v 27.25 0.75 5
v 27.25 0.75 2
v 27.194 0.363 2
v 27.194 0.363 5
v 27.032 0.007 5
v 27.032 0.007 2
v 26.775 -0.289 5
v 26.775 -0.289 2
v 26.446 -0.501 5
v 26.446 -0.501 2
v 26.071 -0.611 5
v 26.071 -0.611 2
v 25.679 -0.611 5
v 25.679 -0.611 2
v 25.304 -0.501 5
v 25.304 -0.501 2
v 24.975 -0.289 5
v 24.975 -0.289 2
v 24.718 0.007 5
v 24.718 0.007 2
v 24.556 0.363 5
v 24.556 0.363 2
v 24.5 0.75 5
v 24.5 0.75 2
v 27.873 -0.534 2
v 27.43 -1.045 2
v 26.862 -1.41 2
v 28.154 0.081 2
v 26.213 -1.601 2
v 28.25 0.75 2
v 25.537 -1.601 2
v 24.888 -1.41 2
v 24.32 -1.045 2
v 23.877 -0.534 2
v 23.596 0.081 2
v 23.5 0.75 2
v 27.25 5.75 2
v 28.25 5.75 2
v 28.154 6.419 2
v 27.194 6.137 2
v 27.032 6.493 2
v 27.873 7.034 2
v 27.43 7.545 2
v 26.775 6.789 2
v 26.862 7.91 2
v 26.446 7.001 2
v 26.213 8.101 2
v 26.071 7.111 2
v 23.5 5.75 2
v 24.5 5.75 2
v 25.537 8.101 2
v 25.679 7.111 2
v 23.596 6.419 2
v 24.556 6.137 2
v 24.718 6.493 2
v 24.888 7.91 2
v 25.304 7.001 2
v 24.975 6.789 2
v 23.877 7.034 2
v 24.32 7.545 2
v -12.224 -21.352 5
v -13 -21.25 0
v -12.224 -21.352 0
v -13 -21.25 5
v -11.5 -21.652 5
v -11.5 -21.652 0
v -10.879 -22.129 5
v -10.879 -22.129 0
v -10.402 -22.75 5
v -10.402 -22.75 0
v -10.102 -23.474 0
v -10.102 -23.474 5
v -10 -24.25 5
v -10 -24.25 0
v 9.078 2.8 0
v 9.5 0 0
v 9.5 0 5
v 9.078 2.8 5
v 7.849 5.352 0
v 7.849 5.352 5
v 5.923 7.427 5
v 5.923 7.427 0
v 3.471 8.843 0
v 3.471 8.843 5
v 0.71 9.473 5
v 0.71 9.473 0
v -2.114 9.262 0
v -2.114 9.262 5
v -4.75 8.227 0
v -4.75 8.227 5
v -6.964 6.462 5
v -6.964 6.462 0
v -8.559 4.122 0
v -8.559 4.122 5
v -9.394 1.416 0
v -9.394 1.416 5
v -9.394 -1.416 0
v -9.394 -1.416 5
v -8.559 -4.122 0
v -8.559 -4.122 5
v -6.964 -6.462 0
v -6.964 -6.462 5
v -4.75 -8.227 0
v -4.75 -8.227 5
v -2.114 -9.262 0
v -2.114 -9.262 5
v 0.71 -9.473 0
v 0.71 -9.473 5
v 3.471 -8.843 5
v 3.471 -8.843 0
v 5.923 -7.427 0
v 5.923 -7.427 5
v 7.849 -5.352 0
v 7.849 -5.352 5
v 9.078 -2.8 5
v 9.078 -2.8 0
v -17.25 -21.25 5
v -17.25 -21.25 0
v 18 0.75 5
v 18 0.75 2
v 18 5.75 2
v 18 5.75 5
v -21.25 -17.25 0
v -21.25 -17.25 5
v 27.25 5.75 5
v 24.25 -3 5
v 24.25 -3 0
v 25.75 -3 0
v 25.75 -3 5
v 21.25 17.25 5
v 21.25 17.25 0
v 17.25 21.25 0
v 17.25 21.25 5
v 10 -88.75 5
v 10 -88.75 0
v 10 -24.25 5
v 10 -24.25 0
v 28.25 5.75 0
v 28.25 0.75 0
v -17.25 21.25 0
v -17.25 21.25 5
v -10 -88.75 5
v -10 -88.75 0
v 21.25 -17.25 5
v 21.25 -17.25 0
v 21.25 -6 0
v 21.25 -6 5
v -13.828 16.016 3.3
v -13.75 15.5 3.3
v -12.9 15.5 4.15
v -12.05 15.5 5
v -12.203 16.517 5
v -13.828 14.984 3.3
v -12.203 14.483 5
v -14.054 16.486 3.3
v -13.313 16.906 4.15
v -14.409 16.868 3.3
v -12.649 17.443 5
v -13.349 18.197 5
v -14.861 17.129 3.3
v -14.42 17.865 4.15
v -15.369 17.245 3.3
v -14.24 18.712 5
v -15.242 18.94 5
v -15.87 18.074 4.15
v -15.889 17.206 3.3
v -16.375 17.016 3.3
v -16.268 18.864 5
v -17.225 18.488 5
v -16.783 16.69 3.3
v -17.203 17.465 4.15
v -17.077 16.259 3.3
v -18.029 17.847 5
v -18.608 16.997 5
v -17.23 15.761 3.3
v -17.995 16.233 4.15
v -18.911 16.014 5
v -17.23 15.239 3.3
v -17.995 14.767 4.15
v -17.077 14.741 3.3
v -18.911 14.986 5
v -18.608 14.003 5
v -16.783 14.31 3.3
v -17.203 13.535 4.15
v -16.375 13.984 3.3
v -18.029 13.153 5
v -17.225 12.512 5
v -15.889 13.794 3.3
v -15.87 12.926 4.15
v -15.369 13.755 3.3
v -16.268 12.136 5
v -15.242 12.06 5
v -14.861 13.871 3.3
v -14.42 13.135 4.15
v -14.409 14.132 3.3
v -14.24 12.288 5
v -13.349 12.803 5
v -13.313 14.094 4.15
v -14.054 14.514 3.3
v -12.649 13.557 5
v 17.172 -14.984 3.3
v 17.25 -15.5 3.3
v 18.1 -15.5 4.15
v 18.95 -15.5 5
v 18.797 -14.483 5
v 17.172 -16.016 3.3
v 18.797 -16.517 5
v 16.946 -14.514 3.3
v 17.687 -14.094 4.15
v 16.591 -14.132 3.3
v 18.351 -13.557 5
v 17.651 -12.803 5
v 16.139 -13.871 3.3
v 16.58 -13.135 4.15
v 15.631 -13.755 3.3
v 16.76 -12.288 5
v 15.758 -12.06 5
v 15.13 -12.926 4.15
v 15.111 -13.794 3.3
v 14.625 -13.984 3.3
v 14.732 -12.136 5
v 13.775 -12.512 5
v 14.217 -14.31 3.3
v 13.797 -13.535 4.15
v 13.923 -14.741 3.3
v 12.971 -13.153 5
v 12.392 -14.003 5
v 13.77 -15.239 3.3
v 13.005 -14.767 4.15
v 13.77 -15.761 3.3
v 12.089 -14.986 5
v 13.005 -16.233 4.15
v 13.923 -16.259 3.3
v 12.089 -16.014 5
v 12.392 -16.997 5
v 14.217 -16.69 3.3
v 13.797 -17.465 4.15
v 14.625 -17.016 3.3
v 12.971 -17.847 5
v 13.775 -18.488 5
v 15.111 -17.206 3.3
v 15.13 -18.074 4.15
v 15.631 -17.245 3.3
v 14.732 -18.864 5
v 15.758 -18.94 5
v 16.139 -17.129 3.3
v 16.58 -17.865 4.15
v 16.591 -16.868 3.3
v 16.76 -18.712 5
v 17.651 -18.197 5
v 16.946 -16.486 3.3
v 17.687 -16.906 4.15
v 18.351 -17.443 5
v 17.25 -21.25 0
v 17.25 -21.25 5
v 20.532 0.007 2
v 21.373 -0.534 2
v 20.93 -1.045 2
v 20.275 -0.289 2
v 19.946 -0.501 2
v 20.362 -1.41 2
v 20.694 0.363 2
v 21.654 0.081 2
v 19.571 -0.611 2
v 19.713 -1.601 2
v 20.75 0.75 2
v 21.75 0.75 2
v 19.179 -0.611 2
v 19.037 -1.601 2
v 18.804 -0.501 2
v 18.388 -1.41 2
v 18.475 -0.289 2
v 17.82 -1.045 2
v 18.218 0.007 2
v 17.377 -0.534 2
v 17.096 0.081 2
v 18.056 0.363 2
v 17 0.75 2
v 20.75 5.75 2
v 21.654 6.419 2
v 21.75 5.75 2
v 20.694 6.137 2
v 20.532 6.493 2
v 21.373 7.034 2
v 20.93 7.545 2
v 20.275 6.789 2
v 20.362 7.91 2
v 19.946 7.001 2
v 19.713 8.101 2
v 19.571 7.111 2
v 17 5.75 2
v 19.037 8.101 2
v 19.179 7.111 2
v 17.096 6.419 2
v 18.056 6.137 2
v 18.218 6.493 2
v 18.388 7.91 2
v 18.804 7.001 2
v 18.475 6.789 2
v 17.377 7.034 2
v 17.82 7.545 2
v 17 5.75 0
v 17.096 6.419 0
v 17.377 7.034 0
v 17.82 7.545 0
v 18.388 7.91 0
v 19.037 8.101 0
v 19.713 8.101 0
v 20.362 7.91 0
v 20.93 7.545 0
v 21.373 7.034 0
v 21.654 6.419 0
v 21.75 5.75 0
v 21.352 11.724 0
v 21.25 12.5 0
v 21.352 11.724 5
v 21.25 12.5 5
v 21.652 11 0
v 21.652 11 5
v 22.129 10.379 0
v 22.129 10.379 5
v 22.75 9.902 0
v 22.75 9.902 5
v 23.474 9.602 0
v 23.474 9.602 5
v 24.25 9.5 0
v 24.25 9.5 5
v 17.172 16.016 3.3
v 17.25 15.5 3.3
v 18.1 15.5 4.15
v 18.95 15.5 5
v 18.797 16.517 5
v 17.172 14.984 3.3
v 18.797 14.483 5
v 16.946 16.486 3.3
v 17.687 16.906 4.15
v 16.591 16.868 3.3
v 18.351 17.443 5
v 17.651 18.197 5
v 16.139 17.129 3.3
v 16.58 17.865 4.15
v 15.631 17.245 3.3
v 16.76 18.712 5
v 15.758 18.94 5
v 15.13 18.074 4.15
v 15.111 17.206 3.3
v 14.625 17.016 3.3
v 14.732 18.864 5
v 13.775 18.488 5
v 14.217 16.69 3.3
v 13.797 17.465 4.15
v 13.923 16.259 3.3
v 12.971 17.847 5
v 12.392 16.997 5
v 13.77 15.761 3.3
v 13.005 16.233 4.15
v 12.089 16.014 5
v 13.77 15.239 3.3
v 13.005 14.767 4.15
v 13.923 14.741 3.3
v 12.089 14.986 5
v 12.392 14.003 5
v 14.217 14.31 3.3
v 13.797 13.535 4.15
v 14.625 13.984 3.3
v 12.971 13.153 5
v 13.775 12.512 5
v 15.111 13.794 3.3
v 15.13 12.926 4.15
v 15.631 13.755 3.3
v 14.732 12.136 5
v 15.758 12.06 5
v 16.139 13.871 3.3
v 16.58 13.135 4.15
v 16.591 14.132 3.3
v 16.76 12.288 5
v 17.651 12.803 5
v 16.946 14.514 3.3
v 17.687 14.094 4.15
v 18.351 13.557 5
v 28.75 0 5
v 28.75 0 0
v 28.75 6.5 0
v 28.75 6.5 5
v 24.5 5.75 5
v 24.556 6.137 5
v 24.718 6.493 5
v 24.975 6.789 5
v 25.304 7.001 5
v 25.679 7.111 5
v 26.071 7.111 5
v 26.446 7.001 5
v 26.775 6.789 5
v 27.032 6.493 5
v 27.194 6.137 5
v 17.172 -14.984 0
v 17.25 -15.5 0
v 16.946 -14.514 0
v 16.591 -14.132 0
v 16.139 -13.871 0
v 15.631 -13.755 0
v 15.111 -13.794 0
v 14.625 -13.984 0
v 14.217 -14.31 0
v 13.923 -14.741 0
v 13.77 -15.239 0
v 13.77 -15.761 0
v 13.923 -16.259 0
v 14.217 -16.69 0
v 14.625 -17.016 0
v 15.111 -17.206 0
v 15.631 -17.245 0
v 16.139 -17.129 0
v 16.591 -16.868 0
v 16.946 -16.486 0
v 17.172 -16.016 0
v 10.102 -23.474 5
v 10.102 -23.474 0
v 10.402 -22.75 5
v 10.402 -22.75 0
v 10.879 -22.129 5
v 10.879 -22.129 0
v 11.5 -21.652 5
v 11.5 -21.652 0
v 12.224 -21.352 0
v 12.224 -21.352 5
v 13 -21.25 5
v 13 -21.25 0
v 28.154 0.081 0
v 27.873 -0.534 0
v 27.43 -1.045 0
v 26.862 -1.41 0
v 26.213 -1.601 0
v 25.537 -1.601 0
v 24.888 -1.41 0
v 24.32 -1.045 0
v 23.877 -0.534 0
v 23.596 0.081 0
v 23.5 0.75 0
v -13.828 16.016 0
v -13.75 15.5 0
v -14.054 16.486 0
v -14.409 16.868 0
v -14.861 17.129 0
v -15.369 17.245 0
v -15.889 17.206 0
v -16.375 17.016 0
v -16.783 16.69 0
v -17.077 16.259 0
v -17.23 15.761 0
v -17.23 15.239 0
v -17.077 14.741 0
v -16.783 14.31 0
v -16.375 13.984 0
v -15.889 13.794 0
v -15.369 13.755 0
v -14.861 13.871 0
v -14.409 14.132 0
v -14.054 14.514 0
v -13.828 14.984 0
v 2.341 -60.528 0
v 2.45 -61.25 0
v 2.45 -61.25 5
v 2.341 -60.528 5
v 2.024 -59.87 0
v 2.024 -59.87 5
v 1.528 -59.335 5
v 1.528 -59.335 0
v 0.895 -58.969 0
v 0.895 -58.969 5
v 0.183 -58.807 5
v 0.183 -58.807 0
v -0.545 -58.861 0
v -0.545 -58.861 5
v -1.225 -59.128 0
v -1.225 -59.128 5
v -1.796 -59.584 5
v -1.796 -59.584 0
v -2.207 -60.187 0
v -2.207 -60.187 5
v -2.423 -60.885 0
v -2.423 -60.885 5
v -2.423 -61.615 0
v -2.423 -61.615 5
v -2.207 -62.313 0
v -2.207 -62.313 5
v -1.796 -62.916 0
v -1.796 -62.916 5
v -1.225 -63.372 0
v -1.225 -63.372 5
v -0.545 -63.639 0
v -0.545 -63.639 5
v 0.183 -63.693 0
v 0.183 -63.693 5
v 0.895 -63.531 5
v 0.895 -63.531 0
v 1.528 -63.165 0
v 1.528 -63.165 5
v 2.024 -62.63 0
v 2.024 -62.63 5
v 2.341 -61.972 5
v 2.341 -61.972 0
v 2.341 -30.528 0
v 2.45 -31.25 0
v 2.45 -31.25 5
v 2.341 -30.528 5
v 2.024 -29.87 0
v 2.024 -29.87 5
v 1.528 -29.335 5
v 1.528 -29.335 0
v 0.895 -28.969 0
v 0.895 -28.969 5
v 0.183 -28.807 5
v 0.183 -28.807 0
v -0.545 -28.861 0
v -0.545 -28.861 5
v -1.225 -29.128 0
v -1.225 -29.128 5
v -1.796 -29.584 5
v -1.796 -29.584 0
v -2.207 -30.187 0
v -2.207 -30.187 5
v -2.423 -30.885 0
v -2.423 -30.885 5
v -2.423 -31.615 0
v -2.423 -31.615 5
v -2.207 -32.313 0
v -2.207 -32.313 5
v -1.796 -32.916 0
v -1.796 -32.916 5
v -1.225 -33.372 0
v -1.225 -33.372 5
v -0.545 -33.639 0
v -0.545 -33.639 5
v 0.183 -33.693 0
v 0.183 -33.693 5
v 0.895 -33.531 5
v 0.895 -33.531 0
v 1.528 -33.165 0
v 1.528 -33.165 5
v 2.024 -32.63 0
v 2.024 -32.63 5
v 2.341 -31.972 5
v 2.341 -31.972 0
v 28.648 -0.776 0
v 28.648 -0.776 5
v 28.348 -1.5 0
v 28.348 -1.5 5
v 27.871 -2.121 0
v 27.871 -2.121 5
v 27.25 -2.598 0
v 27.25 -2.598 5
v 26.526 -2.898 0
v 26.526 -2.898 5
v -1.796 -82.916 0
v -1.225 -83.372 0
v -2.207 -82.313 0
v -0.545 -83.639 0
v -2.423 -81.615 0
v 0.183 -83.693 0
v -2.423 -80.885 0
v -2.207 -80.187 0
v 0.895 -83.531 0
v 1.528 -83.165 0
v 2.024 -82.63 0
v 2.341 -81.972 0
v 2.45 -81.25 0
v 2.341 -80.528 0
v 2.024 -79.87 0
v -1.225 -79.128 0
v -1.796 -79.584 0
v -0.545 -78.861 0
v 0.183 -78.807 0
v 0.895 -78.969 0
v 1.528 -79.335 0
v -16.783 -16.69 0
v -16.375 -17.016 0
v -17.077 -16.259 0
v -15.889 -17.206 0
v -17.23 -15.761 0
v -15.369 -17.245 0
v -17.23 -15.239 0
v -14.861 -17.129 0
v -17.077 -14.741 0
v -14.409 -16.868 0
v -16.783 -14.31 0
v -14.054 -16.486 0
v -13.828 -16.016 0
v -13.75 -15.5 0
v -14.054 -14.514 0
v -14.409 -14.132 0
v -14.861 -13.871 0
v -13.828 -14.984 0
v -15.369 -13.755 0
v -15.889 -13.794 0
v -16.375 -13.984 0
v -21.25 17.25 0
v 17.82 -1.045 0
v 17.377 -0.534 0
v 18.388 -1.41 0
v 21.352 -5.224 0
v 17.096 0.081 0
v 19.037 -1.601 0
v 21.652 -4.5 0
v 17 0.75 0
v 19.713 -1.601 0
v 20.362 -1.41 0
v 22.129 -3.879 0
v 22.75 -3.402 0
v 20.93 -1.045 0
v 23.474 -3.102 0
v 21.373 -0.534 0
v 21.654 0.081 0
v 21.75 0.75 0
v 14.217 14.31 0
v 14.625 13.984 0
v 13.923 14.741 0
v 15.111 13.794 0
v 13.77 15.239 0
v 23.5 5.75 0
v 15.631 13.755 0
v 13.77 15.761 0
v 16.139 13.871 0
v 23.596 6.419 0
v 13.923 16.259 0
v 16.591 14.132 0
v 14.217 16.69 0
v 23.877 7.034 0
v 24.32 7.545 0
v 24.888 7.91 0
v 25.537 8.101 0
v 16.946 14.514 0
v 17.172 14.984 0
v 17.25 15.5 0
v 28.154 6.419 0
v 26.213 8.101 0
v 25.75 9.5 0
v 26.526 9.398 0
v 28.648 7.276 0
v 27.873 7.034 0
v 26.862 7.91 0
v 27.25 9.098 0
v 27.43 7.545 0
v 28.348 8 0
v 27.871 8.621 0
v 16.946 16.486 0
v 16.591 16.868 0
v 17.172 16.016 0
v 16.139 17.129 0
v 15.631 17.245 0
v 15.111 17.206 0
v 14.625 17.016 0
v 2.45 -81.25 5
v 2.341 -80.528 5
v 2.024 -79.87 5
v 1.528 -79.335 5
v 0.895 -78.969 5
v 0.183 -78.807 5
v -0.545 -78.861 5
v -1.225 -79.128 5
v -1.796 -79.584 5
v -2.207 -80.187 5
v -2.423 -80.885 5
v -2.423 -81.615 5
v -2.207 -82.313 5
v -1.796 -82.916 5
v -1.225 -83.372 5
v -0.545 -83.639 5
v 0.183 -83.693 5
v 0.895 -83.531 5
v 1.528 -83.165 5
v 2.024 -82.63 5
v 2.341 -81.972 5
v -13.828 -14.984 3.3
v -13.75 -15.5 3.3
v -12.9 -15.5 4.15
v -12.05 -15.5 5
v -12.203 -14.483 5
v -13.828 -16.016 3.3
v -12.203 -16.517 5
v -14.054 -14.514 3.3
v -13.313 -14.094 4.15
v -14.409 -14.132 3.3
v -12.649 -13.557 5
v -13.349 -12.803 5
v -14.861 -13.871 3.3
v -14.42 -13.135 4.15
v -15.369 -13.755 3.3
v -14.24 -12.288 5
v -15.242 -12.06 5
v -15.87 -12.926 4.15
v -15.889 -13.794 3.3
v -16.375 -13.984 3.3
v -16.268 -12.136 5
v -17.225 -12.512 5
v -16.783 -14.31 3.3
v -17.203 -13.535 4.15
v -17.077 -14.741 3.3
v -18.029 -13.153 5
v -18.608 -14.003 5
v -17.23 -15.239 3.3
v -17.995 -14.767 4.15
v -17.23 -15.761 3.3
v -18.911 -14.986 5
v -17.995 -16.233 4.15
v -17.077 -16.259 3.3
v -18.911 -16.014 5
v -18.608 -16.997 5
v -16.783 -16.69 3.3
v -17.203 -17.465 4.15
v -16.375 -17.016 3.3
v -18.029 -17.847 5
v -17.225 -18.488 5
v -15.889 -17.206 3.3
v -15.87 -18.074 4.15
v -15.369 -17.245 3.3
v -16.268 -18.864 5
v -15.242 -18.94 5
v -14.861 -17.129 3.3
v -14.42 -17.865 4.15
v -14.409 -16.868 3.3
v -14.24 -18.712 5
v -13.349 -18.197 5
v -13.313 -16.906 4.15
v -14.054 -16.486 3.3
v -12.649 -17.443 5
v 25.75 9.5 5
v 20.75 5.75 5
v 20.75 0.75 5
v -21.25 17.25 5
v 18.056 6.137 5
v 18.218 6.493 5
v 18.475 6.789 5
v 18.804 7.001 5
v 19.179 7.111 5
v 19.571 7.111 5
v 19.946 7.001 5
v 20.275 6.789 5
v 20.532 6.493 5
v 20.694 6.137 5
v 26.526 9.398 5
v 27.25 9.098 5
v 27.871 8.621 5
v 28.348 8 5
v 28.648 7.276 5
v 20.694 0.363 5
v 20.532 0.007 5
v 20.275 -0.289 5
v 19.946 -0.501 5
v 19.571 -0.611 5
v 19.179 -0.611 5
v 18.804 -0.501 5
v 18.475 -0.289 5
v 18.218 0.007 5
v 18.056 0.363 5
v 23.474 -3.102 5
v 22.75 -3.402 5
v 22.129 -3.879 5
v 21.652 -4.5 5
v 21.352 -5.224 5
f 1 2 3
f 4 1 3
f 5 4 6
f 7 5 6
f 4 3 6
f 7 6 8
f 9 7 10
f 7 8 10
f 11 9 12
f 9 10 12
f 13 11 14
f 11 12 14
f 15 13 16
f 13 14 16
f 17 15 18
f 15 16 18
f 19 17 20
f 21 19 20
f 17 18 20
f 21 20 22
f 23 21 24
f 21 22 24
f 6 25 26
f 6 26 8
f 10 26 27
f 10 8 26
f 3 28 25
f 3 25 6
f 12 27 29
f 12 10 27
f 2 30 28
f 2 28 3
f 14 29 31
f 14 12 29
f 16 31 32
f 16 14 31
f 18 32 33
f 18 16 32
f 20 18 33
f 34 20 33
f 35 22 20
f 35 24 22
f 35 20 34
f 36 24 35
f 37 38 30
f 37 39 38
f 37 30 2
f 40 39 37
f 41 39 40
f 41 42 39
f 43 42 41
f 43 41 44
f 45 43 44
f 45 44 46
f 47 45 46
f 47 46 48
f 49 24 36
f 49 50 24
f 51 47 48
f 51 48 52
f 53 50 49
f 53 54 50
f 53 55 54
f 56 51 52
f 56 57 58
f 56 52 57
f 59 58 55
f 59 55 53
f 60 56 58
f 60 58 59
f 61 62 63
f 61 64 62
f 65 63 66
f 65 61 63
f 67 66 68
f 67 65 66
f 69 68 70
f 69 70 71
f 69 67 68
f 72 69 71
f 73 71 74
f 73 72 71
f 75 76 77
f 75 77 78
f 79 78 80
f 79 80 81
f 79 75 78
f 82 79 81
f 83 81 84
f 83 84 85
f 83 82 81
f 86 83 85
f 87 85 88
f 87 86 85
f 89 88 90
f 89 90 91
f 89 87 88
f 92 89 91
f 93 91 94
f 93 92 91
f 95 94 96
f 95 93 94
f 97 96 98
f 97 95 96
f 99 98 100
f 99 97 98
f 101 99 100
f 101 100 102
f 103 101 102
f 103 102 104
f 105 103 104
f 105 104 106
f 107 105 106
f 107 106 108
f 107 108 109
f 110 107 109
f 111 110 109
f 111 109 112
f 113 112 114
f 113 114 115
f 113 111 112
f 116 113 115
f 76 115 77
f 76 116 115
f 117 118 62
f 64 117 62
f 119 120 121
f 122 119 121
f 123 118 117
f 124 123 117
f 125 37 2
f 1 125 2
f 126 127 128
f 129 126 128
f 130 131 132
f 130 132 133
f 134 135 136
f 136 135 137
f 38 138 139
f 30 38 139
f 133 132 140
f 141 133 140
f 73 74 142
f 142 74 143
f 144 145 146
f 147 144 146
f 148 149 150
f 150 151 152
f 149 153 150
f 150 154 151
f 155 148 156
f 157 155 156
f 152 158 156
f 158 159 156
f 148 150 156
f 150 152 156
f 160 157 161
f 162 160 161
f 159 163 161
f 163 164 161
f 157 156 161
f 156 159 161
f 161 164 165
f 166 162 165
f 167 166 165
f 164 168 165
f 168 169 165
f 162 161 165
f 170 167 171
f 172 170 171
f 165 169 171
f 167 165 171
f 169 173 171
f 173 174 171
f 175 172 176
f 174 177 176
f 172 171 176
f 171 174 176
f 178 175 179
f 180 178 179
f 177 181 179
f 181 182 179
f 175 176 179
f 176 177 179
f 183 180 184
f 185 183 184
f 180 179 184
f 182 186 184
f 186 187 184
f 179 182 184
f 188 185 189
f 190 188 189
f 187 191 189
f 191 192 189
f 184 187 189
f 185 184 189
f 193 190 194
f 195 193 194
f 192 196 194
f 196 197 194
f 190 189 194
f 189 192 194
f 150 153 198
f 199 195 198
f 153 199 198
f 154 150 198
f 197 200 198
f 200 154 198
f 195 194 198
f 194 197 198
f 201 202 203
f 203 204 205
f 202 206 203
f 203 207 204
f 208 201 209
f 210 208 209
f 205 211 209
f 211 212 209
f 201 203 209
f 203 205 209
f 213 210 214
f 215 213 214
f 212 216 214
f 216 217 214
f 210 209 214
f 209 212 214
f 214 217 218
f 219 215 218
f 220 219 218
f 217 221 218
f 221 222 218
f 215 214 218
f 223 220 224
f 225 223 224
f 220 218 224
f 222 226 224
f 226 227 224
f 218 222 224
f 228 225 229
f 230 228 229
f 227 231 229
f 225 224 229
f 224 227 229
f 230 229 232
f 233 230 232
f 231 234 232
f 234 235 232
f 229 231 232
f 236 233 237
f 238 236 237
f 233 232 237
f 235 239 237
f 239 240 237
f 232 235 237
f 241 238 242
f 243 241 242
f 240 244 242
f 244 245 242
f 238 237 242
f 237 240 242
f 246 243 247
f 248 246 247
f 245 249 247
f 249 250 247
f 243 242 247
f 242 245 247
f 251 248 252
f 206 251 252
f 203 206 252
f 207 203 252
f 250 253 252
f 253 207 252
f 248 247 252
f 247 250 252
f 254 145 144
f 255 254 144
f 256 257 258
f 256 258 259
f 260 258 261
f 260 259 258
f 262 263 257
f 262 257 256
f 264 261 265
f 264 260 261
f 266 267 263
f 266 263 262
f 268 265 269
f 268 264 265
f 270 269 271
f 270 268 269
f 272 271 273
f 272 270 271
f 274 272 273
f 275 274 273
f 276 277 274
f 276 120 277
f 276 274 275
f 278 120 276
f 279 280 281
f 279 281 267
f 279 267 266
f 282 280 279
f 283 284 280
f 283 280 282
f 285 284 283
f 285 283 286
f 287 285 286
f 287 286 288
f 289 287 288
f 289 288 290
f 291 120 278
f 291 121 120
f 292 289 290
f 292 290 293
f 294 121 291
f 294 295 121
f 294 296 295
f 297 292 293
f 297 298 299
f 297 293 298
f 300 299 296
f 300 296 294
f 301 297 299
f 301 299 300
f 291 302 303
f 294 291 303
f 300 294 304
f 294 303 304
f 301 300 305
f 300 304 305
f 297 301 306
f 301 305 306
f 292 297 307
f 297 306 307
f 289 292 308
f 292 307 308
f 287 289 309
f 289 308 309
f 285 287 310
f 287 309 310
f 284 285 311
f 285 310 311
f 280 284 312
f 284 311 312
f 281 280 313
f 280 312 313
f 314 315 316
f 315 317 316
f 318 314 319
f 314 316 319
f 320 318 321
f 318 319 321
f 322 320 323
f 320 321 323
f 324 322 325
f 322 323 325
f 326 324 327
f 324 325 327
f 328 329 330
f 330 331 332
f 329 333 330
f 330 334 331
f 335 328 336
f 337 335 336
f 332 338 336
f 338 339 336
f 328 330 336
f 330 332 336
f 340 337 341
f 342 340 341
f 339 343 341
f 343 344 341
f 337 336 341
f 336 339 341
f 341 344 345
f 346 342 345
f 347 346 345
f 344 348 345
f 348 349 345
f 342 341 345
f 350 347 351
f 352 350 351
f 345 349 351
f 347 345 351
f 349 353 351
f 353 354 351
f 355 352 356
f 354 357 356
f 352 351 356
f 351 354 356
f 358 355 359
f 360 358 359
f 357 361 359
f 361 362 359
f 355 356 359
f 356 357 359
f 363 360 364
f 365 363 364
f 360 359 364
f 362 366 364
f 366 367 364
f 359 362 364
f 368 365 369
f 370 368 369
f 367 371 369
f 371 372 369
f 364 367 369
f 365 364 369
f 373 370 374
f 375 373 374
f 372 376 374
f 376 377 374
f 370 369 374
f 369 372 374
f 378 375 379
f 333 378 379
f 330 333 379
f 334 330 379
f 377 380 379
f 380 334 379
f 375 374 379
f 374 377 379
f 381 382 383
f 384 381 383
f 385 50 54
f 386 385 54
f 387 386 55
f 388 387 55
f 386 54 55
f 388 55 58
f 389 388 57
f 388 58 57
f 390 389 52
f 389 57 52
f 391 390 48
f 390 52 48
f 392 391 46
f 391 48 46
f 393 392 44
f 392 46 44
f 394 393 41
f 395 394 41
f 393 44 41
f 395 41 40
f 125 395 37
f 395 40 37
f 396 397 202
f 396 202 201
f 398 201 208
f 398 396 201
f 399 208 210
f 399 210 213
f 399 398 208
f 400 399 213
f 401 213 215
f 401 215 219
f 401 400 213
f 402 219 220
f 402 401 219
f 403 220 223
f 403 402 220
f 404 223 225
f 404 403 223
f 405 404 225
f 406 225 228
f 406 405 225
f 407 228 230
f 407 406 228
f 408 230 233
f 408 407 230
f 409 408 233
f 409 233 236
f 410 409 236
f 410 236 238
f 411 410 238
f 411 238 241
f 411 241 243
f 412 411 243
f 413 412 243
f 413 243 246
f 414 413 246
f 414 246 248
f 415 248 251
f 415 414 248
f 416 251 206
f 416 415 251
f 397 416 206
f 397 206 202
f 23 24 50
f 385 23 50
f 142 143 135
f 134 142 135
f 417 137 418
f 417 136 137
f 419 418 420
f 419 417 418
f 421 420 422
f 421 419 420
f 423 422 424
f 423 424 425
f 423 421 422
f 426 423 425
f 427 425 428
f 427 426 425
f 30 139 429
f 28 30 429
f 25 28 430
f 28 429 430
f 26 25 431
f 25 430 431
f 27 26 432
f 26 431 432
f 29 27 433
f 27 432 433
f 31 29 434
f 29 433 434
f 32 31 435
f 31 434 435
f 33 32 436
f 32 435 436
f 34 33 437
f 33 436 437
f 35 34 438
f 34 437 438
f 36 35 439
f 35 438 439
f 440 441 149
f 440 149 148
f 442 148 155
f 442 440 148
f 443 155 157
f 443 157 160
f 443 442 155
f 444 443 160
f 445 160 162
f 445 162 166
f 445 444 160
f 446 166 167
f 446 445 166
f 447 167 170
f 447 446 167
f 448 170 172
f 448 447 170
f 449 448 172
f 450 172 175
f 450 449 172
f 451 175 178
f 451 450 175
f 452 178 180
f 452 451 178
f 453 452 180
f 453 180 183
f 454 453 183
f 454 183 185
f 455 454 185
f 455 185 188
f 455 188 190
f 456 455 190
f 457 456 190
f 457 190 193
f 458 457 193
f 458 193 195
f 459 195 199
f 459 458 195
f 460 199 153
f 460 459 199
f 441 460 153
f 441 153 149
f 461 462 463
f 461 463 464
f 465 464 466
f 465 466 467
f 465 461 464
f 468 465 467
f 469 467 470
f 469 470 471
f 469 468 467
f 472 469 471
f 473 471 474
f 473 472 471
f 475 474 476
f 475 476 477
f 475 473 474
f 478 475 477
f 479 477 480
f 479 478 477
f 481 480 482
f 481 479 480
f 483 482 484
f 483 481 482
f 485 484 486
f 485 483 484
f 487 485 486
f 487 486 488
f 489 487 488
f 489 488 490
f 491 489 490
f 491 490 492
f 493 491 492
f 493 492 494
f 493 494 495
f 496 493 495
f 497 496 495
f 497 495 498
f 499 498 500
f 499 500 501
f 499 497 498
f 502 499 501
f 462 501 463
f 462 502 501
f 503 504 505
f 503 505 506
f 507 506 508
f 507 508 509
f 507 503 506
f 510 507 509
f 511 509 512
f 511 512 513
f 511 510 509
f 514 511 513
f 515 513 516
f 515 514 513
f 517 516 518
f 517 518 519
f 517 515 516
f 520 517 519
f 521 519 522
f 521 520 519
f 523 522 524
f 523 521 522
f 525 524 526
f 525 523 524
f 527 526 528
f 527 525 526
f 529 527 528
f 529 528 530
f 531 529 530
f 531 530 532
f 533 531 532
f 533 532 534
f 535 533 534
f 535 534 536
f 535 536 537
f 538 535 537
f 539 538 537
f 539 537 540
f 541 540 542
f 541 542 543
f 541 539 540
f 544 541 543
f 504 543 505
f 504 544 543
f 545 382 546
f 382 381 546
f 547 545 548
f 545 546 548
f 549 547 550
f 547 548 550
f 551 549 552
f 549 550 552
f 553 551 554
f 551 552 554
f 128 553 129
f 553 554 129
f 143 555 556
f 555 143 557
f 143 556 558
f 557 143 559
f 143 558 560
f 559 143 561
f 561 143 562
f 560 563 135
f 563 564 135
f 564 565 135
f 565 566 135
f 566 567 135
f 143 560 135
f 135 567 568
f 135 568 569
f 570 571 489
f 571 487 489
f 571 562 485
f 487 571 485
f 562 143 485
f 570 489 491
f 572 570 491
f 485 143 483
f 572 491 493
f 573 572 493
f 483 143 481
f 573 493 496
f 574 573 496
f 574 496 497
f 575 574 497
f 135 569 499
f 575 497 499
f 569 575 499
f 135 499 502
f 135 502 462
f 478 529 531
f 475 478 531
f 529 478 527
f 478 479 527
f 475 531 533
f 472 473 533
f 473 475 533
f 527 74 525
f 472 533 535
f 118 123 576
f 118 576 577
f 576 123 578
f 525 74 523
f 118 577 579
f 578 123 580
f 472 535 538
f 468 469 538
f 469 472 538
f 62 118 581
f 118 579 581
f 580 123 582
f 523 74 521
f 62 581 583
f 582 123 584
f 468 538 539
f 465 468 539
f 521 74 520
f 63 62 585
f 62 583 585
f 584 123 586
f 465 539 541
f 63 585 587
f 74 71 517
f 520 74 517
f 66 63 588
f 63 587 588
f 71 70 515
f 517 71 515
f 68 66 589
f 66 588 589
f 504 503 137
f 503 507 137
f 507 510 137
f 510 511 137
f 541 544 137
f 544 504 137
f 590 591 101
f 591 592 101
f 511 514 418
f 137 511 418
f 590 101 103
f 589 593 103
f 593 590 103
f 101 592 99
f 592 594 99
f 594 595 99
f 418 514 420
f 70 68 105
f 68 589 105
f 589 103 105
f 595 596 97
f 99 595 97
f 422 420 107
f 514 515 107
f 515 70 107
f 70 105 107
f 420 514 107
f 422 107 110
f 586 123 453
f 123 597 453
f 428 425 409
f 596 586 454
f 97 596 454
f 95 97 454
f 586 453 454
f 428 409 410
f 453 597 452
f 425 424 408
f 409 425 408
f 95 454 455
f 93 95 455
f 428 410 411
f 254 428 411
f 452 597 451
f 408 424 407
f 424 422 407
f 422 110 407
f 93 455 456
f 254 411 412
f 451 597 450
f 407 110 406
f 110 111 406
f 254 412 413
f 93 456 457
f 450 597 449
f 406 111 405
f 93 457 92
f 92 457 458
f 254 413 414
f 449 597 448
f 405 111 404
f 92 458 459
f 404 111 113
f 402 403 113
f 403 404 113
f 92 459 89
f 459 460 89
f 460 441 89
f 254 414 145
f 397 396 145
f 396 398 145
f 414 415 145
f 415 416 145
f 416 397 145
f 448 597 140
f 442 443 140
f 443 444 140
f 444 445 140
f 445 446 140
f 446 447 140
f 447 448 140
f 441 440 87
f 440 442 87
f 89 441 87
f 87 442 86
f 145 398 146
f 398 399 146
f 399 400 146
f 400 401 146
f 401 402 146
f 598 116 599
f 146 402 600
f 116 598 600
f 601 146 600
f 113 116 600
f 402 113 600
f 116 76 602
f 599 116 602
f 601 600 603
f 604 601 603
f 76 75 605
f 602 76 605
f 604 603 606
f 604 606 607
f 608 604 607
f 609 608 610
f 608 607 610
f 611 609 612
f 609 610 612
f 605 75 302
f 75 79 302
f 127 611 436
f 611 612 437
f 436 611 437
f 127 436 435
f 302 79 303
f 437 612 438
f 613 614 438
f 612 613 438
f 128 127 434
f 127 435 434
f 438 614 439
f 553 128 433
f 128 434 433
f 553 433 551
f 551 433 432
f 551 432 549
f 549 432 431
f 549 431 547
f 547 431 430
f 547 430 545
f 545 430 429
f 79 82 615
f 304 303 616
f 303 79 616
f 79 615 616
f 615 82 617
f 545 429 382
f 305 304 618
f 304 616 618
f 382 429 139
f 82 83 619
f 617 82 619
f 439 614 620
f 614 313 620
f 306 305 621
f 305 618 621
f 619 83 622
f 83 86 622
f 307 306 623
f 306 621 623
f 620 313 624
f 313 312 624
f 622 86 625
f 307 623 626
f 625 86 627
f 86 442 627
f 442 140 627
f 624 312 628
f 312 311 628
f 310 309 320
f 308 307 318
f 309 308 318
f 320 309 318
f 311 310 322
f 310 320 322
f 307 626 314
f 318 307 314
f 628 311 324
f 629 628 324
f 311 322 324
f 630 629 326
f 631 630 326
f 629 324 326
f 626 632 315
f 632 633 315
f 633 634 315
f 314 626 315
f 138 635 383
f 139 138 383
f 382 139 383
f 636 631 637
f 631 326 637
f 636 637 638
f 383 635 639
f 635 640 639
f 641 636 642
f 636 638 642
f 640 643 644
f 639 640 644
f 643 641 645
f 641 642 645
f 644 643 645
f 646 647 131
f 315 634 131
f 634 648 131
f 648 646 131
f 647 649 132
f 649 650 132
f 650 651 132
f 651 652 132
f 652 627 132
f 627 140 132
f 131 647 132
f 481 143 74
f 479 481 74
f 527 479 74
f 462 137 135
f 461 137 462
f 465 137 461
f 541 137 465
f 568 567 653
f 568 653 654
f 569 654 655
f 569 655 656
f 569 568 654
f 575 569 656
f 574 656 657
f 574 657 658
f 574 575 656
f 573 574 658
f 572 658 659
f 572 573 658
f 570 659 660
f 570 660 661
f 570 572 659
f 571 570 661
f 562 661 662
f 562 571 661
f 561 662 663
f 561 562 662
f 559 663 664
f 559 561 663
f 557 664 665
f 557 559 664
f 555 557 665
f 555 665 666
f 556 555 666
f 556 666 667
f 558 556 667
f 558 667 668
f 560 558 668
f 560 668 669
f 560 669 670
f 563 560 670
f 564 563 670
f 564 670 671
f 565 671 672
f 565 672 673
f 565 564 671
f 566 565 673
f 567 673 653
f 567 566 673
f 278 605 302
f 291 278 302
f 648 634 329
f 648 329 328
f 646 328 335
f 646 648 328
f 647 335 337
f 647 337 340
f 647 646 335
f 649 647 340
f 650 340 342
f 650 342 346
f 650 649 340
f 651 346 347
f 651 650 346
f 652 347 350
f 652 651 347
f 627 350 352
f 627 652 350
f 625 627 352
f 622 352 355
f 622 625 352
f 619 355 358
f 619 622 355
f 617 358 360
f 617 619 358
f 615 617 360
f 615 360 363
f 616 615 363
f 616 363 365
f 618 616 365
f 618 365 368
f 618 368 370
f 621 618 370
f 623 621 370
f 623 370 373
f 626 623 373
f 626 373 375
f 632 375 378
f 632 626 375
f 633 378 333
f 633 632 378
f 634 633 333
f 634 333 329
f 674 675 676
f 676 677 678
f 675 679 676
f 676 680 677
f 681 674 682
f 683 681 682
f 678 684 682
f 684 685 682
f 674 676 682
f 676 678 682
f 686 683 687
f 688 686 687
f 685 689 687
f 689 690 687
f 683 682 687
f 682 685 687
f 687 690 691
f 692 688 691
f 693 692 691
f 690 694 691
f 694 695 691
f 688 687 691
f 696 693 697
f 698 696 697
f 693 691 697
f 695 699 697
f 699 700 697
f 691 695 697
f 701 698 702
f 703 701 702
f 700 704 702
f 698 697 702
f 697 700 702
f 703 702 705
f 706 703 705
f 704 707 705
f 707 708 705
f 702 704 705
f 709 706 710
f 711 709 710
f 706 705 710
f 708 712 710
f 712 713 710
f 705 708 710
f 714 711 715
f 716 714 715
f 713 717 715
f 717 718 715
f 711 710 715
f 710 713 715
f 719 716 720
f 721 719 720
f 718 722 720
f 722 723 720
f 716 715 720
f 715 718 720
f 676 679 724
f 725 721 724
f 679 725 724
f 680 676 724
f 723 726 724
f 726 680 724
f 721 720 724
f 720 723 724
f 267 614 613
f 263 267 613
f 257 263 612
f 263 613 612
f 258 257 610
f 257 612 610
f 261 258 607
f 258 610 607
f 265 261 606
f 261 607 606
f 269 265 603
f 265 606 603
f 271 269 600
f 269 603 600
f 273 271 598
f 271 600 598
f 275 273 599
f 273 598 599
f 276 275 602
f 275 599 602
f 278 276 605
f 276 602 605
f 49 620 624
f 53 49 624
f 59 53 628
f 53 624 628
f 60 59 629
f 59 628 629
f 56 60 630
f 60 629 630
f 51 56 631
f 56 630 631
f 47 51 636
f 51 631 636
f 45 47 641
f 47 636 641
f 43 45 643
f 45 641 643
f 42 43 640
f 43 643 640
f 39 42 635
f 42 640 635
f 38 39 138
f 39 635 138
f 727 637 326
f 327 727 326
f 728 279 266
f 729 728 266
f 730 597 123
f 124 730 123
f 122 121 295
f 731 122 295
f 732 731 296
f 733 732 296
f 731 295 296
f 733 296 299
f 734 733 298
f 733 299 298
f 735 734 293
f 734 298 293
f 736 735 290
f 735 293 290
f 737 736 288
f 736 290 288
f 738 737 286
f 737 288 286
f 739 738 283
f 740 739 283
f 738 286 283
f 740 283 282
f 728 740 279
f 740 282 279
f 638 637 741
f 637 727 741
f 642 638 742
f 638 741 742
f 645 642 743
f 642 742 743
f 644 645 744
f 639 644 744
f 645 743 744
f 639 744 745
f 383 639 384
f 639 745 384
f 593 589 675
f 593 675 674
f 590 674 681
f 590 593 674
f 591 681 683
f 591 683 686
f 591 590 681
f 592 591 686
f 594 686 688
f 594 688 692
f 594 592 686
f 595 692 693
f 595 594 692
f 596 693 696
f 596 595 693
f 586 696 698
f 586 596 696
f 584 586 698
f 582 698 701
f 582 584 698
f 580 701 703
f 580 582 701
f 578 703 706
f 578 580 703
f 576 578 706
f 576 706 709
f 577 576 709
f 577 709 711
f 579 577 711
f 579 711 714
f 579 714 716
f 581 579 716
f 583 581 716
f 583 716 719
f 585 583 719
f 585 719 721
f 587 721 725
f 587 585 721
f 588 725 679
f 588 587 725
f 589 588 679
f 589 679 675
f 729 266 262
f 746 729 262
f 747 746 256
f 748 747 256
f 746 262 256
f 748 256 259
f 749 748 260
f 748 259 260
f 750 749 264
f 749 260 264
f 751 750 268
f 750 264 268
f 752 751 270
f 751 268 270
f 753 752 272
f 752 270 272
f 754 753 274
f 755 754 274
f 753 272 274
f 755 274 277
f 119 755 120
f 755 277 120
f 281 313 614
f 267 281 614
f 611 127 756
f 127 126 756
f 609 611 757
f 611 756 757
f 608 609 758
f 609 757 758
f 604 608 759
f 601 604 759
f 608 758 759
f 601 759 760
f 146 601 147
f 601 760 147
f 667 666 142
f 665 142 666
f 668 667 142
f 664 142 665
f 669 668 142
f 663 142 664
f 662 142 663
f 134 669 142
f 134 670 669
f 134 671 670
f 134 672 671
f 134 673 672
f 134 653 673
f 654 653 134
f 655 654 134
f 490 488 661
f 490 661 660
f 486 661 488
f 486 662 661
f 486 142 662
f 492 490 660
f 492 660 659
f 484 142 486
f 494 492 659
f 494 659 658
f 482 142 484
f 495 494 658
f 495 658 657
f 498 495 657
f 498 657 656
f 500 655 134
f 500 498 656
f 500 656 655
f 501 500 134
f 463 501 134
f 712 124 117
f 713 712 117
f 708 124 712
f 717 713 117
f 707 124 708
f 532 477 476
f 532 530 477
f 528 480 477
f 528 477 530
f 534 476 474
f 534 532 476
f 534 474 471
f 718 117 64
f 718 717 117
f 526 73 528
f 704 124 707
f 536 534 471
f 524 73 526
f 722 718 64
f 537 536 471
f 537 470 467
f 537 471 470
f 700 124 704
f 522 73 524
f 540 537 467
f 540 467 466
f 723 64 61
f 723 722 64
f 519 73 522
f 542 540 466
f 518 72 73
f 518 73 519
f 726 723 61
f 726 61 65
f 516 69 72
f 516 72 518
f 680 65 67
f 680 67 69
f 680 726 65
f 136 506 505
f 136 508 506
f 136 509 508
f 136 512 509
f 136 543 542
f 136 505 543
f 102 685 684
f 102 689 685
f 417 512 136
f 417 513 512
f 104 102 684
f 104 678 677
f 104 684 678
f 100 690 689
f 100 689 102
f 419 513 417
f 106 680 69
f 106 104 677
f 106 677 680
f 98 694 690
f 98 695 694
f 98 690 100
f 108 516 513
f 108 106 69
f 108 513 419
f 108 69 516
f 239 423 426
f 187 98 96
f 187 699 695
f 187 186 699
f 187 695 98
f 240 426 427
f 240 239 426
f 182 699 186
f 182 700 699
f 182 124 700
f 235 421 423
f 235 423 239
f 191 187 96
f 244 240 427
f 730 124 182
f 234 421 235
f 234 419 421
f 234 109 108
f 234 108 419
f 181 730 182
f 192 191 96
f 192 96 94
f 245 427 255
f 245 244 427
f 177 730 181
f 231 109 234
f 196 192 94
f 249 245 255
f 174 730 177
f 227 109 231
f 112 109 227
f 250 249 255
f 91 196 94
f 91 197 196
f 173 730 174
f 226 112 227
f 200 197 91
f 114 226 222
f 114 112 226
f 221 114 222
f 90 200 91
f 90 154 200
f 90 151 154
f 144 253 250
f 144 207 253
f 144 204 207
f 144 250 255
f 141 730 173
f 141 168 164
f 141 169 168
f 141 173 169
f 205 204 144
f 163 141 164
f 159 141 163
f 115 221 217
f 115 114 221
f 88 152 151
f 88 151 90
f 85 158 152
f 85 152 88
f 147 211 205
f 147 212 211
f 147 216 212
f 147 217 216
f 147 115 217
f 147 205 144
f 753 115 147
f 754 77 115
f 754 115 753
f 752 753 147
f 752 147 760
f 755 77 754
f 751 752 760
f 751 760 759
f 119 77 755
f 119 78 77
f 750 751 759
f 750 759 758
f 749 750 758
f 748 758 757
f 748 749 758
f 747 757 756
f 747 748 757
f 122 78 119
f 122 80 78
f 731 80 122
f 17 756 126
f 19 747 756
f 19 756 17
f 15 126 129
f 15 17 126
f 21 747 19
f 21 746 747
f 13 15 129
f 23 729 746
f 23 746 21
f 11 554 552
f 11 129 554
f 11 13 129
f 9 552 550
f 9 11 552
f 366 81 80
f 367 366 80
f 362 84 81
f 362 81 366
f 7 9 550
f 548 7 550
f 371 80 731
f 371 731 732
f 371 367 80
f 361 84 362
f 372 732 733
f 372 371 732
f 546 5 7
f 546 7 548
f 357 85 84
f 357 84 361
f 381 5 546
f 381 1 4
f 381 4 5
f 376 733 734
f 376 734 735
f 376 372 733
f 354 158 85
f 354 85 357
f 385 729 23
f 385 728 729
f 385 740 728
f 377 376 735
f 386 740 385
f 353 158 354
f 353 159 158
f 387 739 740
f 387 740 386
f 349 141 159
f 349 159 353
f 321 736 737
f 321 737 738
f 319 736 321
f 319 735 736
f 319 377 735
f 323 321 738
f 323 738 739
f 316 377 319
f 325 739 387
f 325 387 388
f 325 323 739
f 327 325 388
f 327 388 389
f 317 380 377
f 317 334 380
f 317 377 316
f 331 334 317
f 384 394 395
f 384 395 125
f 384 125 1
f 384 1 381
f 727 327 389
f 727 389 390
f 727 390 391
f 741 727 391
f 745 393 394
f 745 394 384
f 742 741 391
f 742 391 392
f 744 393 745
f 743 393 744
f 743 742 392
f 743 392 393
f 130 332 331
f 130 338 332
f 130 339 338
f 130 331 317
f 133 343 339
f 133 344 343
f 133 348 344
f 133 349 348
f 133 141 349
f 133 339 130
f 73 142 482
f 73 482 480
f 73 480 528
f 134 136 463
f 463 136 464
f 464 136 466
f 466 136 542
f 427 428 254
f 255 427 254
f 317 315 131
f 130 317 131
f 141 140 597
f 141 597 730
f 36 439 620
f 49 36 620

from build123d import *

# Parameters (mm, degrees)
SKETCH_1_R          = 1.75
SKETCH_1_R_2        = 9.5
SKETCH_1_R_3        = 2.45
EXTRUDE_1_DEPTH     = 5
CHAMFER_1_SIZE      = 4
FILLET_1_R          = 3
CHAMFER_2_SIZE      = 1.7
CUT_EXTRUDE_1_DEPTH = 2


with BuildPart() as part:
    # Эскиз1 → Бобышка-Вытянуть1 (new body)
    with BuildSketch(Plane.XY):
        Polygon((-21.25, 21.25), (-21.25, -21.25), (-10, -21.25), (-10, -88.75), (10, -88.75), (10, -21.25), (21.25, -21.25), (21.25, -3), (28.75, -3), (28.75, 9.5), (21.25, 9.5), (21.25, 21.25), align=None)
        with Locations((-15.5, -15.5)):
            Circle(SKETCH_1_R, mode=Mode.SUBTRACT)
        with Locations((-15.5, 15.5)):
            Circle(SKETCH_1_R, mode=Mode.SUBTRACT)
        Circle(SKETCH_1_R_2, mode=Mode.SUBTRACT)
        with Locations((15.5, -15.5)):
            Circle(SKETCH_1_R, mode=Mode.SUBTRACT)
        with Locations((15.5, 15.5)):
            Circle(SKETCH_1_R, mode=Mode.SUBTRACT)
        with BuildLine():
            ThreePointArc((20.75, 0.75), (19.375, -0.625), (18, 0.75))
            Line((18, 0.75), (18, 5.75))
            ThreePointArc((18, 5.75), (19.375, 7.125), (20.75, 5.75))
            Line((20.75, 5.75), (20.75, 0.75))
        make_face(mode=Mode.SUBTRACT)
        with Locations((0, -31.25)):
            Circle(SKETCH_1_R_3, mode=Mode.SUBTRACT)
        with Locations((0, -81.25)):
            Circle(SKETCH_1_R_3, mode=Mode.SUBTRACT)
        with Locations((0, -61.25)):
            Circle(SKETCH_1_R_3, mode=Mode.SUBTRACT)
        with BuildLine():
            Line((24.5, 0.75), (24.5, 5.75))
            ThreePointArc((24.5, 5.75), (25.875, 7.125), (27.25, 5.75))
            Line((27.25, 5.75), (27.25, 0.75))
            ThreePointArc((27.25, 0.75), (25.875, -0.625), (24.5, 0.75))
        make_face(mode=Mode.SUBTRACT)
    extrude(amount=EXTRUDE_1_DEPTH)

    # Фаска1
    chamfer_1_edges = [part.edges().sort_by_distance(p)[0] for p in [
        (-21.25, -21.25, 2.5),
        (-21.25, 21.25, 2.5),
        (21.25, 21.25, 2.5),
        (21.25, -21.25, 2.5),
    ]]
    chamfer(chamfer_1_edges, length=CHAMFER_1_SIZE)

    # Скругление1
    fillet_1_edges = [part.edges().sort_by_distance(p)[0] for p in [
        (21.25, 9.5, 2.5),
        (28.75, 9.5, 2.5),
        (28.75, -3, 2.5),
        (21.25, -3, 2.5),
        (10, -21.25, 2.5),
        (-10, -21.25, 2.5),
    ]]
    fillet(fillet_1_edges, radius=FILLET_1_R)

    # Фаска2
    chamfer_2_edges = [part.edges().sort_by_distance(p)[0] for p in [
        (-17.25, -15.5, 5),
        (13.75, -15.5, 5),
        (13.75, 15.5, 5),
        (-17.25, 15.5, 5),
    ]]
    chamfer(chamfer_2_edges, length=CHAMFER_2_SIZE)

    # Эскиз2 → Вырез-Вытянуть1 (cut)
    with BuildSketch(Plane(origin=(0, 0, 0), x_dir=(-1, 0, 0), z_dir=(0, 0, -1))):
        with BuildLine():
            Line((-28.25, 5.75), (-28.25, 0.75))
            ThreePointArc((-28.25, 0.75), (-25.875, -1.625), (-23.5, 0.75))
            Line((-23.5, 0.75), (-23.5, 5.75))
            ThreePointArc((-23.5, 5.75), (-25.875, 8.125), (-28.25, 5.75))
        make_face()
        with BuildLine():
            Line((-17, 0.75), (-17, 5.75))
            ThreePointArc((-17, 5.75), (-19.375, 8.125), (-21.75, 5.75))
            Line((-21.75, 5.75), (-21.75, 0.75))
            ThreePointArc((-21.75, 0.75), (-19.375, -1.625), (-17, 0.75))
        make_face()
    extrude(amount=-CUT_EXTRUDE_1_DEPTH, mode=Mode.SUBTRACT)


solid = part.part
